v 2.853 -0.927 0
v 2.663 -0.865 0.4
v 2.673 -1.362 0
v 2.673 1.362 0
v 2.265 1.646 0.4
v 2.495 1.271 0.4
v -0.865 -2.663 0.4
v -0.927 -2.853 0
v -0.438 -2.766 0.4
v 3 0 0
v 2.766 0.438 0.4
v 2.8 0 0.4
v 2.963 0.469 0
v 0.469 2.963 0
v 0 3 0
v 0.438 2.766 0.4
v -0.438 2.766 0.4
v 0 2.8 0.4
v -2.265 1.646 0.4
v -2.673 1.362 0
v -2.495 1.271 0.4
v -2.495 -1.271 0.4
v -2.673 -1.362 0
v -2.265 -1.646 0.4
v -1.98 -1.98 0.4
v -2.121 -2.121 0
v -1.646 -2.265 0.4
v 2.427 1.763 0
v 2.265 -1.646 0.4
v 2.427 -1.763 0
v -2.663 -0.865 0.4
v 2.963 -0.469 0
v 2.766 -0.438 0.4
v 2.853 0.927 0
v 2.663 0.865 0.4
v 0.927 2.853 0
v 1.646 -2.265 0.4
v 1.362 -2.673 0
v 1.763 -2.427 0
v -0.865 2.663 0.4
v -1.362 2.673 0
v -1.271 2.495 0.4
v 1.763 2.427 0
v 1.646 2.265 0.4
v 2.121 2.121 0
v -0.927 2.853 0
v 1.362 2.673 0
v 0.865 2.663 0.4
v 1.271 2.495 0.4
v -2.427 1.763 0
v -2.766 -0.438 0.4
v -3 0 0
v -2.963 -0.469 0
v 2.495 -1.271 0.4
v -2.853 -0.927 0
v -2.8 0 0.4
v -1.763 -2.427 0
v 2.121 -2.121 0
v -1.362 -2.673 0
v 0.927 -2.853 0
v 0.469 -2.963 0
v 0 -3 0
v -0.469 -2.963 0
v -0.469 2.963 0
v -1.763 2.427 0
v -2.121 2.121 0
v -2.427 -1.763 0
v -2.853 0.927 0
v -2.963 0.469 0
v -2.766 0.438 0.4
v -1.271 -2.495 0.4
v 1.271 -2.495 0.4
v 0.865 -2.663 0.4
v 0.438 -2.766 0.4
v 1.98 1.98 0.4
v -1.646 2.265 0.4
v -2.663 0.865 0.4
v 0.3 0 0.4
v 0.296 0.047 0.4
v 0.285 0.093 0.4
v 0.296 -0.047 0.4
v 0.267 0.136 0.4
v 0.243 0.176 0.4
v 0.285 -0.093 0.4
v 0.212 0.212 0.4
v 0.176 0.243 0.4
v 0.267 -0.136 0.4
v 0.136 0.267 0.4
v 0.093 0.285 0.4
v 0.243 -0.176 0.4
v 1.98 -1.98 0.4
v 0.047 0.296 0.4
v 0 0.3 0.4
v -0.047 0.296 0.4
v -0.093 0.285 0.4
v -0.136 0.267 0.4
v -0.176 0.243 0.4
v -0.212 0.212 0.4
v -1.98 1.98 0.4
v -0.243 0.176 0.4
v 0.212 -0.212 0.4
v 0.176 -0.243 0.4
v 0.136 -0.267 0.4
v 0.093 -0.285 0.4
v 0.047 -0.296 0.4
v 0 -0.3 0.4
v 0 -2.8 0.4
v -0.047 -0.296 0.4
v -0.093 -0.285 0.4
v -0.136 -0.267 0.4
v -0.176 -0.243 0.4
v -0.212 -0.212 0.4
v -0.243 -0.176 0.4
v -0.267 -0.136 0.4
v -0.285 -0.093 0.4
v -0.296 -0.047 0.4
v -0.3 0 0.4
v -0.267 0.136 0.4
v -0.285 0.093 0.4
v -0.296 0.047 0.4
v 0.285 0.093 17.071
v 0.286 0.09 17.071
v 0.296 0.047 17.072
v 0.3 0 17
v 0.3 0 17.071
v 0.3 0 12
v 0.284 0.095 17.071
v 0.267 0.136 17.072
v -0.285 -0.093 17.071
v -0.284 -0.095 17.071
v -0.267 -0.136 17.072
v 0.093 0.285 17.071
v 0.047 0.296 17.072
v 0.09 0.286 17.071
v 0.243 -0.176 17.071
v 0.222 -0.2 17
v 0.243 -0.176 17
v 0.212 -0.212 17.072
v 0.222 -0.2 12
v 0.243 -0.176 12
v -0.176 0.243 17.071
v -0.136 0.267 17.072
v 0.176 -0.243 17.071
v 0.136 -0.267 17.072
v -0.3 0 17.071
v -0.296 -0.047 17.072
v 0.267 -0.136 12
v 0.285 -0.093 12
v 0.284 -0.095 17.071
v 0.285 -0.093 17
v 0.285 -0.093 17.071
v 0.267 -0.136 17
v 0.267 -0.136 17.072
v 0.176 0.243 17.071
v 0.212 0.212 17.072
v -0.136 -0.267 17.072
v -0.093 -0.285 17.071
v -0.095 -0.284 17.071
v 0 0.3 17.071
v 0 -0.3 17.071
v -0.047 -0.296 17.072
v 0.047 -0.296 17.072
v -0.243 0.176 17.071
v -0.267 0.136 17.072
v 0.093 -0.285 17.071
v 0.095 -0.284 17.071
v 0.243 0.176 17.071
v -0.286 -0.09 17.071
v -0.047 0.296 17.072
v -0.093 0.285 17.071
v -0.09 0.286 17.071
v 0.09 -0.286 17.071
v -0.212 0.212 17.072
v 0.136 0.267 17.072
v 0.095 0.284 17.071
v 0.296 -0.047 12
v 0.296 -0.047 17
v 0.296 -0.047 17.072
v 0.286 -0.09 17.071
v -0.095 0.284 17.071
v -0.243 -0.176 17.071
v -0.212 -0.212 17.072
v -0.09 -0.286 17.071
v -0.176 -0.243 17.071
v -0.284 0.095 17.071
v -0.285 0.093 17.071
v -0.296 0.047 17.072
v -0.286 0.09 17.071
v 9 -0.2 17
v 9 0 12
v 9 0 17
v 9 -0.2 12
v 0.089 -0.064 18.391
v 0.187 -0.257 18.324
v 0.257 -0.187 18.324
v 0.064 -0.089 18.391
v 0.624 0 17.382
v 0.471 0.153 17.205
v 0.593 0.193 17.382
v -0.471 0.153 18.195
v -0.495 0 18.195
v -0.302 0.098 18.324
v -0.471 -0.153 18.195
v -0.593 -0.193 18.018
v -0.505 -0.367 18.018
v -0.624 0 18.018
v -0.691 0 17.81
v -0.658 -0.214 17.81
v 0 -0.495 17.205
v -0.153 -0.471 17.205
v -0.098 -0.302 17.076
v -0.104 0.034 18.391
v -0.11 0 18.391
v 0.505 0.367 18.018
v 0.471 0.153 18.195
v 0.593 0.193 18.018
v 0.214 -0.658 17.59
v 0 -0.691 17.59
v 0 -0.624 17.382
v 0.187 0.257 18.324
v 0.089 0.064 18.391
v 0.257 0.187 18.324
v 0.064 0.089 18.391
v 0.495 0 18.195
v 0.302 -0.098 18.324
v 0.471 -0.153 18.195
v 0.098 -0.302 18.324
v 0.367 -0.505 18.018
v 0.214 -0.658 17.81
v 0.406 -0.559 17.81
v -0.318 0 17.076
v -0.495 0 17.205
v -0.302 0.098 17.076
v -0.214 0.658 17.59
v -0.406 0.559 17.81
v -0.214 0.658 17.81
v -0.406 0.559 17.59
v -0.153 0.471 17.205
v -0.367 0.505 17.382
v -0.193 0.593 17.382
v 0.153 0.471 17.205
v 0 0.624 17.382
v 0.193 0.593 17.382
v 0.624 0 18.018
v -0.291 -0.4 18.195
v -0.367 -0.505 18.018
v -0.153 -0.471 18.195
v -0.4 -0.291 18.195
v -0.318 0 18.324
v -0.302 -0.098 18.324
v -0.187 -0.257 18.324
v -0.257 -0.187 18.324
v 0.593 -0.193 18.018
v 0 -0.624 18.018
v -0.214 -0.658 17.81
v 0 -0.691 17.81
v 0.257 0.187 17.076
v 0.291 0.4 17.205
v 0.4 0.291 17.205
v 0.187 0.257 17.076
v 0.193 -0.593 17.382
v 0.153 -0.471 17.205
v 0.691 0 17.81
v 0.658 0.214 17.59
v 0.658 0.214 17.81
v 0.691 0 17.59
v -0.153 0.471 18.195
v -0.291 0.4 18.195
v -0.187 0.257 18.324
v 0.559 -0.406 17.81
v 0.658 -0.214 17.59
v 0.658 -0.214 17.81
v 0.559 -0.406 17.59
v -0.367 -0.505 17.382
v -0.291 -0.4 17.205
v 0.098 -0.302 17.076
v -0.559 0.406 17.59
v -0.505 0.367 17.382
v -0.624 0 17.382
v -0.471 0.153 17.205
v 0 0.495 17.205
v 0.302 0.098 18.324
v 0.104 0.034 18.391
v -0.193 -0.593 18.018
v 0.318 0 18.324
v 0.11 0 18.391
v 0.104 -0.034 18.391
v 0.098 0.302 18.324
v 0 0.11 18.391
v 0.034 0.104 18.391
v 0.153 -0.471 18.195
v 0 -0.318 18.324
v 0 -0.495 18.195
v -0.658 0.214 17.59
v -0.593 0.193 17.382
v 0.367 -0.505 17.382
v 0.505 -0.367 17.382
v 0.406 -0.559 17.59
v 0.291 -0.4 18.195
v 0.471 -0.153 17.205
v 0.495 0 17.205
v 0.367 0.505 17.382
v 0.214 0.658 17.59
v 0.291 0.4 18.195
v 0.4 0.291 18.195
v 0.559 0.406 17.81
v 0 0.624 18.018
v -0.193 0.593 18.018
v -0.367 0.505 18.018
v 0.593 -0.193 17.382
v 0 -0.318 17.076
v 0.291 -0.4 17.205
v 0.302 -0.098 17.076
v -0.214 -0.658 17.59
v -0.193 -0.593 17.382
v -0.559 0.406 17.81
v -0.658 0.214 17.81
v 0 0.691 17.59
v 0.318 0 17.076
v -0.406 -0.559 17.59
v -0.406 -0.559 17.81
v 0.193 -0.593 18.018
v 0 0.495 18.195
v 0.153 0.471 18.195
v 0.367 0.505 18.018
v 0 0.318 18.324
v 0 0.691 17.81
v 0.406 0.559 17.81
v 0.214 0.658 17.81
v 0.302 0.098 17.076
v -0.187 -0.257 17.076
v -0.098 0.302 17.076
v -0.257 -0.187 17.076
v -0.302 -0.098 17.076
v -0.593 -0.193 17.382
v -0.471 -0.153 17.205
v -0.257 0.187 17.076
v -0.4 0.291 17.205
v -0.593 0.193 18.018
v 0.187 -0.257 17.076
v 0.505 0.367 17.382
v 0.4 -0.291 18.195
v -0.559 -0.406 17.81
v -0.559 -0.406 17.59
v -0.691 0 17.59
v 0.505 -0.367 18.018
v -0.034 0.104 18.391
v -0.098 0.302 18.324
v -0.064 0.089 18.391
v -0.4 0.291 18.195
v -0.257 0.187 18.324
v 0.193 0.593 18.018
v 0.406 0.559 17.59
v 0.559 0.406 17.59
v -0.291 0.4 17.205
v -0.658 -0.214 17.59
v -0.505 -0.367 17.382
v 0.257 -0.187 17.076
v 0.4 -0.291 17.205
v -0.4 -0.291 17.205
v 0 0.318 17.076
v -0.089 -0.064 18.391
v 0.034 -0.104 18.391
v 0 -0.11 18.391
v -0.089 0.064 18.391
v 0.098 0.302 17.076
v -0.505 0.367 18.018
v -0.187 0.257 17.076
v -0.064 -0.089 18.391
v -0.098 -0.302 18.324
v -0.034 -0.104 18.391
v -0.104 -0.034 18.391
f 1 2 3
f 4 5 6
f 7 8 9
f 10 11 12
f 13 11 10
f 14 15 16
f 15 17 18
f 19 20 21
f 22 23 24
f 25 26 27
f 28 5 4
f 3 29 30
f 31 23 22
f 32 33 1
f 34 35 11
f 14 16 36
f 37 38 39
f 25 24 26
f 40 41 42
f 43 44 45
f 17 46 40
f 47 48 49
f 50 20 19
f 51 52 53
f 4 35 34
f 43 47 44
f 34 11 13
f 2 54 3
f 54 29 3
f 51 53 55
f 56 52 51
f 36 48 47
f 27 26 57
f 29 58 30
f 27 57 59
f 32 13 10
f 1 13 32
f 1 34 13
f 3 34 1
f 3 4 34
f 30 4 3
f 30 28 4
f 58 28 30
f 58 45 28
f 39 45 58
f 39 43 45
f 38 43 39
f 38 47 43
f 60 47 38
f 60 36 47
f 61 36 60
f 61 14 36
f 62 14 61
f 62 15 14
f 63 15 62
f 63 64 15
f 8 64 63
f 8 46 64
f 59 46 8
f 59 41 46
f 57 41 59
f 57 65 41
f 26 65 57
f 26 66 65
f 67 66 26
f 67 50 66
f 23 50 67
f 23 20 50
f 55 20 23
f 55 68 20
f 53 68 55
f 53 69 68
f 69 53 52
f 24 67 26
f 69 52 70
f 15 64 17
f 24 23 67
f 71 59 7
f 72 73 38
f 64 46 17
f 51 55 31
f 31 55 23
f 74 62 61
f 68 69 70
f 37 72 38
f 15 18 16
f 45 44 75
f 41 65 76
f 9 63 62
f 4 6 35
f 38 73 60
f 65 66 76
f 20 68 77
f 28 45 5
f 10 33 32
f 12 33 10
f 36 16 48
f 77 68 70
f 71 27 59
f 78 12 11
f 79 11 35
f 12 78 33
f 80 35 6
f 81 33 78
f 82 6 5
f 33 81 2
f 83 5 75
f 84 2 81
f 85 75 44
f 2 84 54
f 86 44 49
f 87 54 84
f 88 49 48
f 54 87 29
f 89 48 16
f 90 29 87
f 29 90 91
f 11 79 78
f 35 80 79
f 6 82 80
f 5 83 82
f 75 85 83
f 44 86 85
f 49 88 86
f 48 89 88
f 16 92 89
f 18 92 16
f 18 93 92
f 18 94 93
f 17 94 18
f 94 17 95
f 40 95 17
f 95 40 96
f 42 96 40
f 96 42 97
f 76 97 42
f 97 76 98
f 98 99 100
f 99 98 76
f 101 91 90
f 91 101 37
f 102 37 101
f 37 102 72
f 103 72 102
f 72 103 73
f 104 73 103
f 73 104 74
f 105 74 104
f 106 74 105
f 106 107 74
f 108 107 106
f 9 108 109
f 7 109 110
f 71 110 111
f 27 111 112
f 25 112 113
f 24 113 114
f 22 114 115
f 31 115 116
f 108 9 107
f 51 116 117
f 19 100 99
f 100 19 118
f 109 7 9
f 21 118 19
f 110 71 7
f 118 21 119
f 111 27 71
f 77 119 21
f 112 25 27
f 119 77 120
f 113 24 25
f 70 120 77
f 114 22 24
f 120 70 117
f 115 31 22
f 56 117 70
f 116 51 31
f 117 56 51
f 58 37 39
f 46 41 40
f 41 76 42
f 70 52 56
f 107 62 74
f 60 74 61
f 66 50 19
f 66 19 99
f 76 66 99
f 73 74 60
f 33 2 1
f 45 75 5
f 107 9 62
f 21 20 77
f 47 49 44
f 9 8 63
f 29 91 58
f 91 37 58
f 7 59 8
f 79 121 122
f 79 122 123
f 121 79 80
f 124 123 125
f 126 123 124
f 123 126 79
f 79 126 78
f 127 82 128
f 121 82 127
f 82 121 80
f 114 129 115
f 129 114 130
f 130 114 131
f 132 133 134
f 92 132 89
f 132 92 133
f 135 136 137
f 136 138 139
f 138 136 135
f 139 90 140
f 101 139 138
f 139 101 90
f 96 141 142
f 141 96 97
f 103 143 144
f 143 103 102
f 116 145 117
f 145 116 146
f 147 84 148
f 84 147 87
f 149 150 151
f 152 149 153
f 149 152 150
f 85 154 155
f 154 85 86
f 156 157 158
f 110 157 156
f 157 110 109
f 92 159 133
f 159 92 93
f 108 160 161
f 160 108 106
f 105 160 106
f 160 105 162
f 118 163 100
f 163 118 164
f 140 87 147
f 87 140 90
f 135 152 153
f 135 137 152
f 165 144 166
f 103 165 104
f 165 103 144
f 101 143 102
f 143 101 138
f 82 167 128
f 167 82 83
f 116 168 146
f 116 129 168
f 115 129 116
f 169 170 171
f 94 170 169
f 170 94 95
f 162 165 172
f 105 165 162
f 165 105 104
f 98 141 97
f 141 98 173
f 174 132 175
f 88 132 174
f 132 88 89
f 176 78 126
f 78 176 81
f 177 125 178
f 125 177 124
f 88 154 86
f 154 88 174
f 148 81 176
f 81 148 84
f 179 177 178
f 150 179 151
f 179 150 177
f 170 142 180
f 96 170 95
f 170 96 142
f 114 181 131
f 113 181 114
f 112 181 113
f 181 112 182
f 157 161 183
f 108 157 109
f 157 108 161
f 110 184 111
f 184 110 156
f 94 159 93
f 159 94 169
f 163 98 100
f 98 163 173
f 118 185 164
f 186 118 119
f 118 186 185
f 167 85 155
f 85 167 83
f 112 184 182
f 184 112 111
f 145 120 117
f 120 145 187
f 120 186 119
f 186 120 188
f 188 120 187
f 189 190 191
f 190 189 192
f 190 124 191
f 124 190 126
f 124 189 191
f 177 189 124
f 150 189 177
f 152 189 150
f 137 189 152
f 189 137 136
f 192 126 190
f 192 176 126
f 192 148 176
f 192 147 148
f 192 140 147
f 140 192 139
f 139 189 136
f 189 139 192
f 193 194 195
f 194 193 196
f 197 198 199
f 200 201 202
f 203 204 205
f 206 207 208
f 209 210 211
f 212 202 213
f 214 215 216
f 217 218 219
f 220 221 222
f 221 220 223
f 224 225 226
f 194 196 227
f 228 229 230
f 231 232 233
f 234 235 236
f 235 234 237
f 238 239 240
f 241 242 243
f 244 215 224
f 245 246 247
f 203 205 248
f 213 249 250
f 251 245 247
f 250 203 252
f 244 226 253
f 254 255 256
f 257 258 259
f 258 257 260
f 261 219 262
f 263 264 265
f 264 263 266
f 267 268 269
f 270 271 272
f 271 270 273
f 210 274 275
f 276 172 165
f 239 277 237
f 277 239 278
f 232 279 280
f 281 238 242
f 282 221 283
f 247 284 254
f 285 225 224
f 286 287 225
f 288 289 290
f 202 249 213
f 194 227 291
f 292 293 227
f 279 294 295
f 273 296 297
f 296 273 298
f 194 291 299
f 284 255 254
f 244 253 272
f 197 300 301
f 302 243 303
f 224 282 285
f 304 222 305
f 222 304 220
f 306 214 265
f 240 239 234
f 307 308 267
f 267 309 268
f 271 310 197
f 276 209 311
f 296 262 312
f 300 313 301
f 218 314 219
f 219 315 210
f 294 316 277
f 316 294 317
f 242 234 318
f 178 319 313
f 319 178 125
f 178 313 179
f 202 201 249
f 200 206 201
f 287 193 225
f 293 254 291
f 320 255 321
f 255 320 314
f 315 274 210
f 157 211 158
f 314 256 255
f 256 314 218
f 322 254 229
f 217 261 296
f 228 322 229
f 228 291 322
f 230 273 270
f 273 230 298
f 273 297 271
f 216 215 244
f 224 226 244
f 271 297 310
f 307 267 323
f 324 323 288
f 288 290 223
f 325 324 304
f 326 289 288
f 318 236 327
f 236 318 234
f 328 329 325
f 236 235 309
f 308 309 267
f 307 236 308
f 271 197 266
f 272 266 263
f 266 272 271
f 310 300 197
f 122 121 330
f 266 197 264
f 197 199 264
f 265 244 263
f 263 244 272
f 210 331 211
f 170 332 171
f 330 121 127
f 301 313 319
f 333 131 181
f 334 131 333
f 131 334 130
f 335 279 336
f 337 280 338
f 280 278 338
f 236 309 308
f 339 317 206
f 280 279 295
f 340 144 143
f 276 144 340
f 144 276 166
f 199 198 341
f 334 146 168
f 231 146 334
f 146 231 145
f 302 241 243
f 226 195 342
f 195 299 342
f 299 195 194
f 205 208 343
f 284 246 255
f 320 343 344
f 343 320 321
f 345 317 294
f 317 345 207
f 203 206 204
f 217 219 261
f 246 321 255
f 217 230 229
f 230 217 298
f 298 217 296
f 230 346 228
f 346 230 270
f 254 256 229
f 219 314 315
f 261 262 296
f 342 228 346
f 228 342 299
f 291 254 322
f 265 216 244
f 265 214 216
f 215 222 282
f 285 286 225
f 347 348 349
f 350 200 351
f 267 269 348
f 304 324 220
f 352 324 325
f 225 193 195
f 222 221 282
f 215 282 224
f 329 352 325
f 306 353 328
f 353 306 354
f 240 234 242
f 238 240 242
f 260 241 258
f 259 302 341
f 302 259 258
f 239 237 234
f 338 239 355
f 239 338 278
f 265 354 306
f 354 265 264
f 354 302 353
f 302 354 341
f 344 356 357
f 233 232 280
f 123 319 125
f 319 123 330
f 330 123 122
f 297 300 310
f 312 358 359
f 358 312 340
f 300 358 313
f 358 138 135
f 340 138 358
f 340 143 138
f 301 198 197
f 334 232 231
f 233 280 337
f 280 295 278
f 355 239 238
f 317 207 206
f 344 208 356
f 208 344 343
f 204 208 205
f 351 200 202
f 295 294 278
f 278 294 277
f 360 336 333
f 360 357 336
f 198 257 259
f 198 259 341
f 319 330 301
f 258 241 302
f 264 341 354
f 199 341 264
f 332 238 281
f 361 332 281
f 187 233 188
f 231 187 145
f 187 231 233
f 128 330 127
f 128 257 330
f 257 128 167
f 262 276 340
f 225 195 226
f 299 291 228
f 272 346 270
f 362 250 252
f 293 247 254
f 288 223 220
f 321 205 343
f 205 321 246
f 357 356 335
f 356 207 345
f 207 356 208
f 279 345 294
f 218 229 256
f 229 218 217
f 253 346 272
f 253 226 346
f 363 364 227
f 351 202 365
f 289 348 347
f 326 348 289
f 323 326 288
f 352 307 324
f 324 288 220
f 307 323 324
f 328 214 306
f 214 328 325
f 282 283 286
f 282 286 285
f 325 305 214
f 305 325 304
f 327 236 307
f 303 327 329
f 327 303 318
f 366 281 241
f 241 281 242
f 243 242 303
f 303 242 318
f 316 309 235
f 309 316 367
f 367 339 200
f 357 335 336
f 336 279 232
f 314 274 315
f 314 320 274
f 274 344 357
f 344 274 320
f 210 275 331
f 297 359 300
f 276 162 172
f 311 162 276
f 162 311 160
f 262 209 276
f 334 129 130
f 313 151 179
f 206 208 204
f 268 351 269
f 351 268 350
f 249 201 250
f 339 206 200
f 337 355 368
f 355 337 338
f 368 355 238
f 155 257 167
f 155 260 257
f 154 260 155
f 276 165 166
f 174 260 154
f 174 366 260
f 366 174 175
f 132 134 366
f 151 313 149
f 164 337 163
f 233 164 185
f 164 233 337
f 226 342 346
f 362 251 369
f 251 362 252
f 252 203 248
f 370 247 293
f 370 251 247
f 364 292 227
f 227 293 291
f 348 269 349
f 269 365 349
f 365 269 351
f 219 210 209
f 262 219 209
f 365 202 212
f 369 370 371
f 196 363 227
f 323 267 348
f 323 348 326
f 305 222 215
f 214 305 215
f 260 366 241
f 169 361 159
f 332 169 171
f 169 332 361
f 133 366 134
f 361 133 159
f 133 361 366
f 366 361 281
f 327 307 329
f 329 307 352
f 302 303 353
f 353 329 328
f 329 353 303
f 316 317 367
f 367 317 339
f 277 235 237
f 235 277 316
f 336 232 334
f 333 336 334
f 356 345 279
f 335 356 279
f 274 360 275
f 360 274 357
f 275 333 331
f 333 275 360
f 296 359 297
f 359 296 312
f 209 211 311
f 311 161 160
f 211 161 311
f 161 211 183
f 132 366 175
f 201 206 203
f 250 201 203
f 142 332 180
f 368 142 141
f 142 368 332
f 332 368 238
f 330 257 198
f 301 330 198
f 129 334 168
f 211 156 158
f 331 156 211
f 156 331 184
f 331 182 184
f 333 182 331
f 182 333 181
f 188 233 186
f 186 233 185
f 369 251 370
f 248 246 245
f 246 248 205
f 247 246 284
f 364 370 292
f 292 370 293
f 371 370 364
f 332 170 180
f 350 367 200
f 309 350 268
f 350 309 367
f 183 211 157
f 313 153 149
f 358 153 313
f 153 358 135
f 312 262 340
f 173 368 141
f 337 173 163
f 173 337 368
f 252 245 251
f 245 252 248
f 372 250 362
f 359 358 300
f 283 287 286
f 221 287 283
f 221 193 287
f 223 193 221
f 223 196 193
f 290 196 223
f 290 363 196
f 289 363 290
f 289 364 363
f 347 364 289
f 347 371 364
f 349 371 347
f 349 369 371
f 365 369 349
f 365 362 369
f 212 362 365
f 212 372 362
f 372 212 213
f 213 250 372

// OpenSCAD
color("gray"){
cylinder(0.4,3,2.8, $fn =40);

translate([0,0,0.3])
cylinder(17,0.3,0.3, $fn = 40);

}


color("gray")

translate([0,0,17.7], $fn = 20)
sphere(r =0.7);


translate([0,0,12])

rotate([90,0,0]){

color("gray")
cube([9,5,0.1]);

color("green")
translate([0,0,0.1])
cube([3,5,0.1]);

color("white")
translate([3,0,0.1])
cube([3,5,0.1]);


color("red")
translate([6,0,0.1])
cube([3,5,0.1]);


}
